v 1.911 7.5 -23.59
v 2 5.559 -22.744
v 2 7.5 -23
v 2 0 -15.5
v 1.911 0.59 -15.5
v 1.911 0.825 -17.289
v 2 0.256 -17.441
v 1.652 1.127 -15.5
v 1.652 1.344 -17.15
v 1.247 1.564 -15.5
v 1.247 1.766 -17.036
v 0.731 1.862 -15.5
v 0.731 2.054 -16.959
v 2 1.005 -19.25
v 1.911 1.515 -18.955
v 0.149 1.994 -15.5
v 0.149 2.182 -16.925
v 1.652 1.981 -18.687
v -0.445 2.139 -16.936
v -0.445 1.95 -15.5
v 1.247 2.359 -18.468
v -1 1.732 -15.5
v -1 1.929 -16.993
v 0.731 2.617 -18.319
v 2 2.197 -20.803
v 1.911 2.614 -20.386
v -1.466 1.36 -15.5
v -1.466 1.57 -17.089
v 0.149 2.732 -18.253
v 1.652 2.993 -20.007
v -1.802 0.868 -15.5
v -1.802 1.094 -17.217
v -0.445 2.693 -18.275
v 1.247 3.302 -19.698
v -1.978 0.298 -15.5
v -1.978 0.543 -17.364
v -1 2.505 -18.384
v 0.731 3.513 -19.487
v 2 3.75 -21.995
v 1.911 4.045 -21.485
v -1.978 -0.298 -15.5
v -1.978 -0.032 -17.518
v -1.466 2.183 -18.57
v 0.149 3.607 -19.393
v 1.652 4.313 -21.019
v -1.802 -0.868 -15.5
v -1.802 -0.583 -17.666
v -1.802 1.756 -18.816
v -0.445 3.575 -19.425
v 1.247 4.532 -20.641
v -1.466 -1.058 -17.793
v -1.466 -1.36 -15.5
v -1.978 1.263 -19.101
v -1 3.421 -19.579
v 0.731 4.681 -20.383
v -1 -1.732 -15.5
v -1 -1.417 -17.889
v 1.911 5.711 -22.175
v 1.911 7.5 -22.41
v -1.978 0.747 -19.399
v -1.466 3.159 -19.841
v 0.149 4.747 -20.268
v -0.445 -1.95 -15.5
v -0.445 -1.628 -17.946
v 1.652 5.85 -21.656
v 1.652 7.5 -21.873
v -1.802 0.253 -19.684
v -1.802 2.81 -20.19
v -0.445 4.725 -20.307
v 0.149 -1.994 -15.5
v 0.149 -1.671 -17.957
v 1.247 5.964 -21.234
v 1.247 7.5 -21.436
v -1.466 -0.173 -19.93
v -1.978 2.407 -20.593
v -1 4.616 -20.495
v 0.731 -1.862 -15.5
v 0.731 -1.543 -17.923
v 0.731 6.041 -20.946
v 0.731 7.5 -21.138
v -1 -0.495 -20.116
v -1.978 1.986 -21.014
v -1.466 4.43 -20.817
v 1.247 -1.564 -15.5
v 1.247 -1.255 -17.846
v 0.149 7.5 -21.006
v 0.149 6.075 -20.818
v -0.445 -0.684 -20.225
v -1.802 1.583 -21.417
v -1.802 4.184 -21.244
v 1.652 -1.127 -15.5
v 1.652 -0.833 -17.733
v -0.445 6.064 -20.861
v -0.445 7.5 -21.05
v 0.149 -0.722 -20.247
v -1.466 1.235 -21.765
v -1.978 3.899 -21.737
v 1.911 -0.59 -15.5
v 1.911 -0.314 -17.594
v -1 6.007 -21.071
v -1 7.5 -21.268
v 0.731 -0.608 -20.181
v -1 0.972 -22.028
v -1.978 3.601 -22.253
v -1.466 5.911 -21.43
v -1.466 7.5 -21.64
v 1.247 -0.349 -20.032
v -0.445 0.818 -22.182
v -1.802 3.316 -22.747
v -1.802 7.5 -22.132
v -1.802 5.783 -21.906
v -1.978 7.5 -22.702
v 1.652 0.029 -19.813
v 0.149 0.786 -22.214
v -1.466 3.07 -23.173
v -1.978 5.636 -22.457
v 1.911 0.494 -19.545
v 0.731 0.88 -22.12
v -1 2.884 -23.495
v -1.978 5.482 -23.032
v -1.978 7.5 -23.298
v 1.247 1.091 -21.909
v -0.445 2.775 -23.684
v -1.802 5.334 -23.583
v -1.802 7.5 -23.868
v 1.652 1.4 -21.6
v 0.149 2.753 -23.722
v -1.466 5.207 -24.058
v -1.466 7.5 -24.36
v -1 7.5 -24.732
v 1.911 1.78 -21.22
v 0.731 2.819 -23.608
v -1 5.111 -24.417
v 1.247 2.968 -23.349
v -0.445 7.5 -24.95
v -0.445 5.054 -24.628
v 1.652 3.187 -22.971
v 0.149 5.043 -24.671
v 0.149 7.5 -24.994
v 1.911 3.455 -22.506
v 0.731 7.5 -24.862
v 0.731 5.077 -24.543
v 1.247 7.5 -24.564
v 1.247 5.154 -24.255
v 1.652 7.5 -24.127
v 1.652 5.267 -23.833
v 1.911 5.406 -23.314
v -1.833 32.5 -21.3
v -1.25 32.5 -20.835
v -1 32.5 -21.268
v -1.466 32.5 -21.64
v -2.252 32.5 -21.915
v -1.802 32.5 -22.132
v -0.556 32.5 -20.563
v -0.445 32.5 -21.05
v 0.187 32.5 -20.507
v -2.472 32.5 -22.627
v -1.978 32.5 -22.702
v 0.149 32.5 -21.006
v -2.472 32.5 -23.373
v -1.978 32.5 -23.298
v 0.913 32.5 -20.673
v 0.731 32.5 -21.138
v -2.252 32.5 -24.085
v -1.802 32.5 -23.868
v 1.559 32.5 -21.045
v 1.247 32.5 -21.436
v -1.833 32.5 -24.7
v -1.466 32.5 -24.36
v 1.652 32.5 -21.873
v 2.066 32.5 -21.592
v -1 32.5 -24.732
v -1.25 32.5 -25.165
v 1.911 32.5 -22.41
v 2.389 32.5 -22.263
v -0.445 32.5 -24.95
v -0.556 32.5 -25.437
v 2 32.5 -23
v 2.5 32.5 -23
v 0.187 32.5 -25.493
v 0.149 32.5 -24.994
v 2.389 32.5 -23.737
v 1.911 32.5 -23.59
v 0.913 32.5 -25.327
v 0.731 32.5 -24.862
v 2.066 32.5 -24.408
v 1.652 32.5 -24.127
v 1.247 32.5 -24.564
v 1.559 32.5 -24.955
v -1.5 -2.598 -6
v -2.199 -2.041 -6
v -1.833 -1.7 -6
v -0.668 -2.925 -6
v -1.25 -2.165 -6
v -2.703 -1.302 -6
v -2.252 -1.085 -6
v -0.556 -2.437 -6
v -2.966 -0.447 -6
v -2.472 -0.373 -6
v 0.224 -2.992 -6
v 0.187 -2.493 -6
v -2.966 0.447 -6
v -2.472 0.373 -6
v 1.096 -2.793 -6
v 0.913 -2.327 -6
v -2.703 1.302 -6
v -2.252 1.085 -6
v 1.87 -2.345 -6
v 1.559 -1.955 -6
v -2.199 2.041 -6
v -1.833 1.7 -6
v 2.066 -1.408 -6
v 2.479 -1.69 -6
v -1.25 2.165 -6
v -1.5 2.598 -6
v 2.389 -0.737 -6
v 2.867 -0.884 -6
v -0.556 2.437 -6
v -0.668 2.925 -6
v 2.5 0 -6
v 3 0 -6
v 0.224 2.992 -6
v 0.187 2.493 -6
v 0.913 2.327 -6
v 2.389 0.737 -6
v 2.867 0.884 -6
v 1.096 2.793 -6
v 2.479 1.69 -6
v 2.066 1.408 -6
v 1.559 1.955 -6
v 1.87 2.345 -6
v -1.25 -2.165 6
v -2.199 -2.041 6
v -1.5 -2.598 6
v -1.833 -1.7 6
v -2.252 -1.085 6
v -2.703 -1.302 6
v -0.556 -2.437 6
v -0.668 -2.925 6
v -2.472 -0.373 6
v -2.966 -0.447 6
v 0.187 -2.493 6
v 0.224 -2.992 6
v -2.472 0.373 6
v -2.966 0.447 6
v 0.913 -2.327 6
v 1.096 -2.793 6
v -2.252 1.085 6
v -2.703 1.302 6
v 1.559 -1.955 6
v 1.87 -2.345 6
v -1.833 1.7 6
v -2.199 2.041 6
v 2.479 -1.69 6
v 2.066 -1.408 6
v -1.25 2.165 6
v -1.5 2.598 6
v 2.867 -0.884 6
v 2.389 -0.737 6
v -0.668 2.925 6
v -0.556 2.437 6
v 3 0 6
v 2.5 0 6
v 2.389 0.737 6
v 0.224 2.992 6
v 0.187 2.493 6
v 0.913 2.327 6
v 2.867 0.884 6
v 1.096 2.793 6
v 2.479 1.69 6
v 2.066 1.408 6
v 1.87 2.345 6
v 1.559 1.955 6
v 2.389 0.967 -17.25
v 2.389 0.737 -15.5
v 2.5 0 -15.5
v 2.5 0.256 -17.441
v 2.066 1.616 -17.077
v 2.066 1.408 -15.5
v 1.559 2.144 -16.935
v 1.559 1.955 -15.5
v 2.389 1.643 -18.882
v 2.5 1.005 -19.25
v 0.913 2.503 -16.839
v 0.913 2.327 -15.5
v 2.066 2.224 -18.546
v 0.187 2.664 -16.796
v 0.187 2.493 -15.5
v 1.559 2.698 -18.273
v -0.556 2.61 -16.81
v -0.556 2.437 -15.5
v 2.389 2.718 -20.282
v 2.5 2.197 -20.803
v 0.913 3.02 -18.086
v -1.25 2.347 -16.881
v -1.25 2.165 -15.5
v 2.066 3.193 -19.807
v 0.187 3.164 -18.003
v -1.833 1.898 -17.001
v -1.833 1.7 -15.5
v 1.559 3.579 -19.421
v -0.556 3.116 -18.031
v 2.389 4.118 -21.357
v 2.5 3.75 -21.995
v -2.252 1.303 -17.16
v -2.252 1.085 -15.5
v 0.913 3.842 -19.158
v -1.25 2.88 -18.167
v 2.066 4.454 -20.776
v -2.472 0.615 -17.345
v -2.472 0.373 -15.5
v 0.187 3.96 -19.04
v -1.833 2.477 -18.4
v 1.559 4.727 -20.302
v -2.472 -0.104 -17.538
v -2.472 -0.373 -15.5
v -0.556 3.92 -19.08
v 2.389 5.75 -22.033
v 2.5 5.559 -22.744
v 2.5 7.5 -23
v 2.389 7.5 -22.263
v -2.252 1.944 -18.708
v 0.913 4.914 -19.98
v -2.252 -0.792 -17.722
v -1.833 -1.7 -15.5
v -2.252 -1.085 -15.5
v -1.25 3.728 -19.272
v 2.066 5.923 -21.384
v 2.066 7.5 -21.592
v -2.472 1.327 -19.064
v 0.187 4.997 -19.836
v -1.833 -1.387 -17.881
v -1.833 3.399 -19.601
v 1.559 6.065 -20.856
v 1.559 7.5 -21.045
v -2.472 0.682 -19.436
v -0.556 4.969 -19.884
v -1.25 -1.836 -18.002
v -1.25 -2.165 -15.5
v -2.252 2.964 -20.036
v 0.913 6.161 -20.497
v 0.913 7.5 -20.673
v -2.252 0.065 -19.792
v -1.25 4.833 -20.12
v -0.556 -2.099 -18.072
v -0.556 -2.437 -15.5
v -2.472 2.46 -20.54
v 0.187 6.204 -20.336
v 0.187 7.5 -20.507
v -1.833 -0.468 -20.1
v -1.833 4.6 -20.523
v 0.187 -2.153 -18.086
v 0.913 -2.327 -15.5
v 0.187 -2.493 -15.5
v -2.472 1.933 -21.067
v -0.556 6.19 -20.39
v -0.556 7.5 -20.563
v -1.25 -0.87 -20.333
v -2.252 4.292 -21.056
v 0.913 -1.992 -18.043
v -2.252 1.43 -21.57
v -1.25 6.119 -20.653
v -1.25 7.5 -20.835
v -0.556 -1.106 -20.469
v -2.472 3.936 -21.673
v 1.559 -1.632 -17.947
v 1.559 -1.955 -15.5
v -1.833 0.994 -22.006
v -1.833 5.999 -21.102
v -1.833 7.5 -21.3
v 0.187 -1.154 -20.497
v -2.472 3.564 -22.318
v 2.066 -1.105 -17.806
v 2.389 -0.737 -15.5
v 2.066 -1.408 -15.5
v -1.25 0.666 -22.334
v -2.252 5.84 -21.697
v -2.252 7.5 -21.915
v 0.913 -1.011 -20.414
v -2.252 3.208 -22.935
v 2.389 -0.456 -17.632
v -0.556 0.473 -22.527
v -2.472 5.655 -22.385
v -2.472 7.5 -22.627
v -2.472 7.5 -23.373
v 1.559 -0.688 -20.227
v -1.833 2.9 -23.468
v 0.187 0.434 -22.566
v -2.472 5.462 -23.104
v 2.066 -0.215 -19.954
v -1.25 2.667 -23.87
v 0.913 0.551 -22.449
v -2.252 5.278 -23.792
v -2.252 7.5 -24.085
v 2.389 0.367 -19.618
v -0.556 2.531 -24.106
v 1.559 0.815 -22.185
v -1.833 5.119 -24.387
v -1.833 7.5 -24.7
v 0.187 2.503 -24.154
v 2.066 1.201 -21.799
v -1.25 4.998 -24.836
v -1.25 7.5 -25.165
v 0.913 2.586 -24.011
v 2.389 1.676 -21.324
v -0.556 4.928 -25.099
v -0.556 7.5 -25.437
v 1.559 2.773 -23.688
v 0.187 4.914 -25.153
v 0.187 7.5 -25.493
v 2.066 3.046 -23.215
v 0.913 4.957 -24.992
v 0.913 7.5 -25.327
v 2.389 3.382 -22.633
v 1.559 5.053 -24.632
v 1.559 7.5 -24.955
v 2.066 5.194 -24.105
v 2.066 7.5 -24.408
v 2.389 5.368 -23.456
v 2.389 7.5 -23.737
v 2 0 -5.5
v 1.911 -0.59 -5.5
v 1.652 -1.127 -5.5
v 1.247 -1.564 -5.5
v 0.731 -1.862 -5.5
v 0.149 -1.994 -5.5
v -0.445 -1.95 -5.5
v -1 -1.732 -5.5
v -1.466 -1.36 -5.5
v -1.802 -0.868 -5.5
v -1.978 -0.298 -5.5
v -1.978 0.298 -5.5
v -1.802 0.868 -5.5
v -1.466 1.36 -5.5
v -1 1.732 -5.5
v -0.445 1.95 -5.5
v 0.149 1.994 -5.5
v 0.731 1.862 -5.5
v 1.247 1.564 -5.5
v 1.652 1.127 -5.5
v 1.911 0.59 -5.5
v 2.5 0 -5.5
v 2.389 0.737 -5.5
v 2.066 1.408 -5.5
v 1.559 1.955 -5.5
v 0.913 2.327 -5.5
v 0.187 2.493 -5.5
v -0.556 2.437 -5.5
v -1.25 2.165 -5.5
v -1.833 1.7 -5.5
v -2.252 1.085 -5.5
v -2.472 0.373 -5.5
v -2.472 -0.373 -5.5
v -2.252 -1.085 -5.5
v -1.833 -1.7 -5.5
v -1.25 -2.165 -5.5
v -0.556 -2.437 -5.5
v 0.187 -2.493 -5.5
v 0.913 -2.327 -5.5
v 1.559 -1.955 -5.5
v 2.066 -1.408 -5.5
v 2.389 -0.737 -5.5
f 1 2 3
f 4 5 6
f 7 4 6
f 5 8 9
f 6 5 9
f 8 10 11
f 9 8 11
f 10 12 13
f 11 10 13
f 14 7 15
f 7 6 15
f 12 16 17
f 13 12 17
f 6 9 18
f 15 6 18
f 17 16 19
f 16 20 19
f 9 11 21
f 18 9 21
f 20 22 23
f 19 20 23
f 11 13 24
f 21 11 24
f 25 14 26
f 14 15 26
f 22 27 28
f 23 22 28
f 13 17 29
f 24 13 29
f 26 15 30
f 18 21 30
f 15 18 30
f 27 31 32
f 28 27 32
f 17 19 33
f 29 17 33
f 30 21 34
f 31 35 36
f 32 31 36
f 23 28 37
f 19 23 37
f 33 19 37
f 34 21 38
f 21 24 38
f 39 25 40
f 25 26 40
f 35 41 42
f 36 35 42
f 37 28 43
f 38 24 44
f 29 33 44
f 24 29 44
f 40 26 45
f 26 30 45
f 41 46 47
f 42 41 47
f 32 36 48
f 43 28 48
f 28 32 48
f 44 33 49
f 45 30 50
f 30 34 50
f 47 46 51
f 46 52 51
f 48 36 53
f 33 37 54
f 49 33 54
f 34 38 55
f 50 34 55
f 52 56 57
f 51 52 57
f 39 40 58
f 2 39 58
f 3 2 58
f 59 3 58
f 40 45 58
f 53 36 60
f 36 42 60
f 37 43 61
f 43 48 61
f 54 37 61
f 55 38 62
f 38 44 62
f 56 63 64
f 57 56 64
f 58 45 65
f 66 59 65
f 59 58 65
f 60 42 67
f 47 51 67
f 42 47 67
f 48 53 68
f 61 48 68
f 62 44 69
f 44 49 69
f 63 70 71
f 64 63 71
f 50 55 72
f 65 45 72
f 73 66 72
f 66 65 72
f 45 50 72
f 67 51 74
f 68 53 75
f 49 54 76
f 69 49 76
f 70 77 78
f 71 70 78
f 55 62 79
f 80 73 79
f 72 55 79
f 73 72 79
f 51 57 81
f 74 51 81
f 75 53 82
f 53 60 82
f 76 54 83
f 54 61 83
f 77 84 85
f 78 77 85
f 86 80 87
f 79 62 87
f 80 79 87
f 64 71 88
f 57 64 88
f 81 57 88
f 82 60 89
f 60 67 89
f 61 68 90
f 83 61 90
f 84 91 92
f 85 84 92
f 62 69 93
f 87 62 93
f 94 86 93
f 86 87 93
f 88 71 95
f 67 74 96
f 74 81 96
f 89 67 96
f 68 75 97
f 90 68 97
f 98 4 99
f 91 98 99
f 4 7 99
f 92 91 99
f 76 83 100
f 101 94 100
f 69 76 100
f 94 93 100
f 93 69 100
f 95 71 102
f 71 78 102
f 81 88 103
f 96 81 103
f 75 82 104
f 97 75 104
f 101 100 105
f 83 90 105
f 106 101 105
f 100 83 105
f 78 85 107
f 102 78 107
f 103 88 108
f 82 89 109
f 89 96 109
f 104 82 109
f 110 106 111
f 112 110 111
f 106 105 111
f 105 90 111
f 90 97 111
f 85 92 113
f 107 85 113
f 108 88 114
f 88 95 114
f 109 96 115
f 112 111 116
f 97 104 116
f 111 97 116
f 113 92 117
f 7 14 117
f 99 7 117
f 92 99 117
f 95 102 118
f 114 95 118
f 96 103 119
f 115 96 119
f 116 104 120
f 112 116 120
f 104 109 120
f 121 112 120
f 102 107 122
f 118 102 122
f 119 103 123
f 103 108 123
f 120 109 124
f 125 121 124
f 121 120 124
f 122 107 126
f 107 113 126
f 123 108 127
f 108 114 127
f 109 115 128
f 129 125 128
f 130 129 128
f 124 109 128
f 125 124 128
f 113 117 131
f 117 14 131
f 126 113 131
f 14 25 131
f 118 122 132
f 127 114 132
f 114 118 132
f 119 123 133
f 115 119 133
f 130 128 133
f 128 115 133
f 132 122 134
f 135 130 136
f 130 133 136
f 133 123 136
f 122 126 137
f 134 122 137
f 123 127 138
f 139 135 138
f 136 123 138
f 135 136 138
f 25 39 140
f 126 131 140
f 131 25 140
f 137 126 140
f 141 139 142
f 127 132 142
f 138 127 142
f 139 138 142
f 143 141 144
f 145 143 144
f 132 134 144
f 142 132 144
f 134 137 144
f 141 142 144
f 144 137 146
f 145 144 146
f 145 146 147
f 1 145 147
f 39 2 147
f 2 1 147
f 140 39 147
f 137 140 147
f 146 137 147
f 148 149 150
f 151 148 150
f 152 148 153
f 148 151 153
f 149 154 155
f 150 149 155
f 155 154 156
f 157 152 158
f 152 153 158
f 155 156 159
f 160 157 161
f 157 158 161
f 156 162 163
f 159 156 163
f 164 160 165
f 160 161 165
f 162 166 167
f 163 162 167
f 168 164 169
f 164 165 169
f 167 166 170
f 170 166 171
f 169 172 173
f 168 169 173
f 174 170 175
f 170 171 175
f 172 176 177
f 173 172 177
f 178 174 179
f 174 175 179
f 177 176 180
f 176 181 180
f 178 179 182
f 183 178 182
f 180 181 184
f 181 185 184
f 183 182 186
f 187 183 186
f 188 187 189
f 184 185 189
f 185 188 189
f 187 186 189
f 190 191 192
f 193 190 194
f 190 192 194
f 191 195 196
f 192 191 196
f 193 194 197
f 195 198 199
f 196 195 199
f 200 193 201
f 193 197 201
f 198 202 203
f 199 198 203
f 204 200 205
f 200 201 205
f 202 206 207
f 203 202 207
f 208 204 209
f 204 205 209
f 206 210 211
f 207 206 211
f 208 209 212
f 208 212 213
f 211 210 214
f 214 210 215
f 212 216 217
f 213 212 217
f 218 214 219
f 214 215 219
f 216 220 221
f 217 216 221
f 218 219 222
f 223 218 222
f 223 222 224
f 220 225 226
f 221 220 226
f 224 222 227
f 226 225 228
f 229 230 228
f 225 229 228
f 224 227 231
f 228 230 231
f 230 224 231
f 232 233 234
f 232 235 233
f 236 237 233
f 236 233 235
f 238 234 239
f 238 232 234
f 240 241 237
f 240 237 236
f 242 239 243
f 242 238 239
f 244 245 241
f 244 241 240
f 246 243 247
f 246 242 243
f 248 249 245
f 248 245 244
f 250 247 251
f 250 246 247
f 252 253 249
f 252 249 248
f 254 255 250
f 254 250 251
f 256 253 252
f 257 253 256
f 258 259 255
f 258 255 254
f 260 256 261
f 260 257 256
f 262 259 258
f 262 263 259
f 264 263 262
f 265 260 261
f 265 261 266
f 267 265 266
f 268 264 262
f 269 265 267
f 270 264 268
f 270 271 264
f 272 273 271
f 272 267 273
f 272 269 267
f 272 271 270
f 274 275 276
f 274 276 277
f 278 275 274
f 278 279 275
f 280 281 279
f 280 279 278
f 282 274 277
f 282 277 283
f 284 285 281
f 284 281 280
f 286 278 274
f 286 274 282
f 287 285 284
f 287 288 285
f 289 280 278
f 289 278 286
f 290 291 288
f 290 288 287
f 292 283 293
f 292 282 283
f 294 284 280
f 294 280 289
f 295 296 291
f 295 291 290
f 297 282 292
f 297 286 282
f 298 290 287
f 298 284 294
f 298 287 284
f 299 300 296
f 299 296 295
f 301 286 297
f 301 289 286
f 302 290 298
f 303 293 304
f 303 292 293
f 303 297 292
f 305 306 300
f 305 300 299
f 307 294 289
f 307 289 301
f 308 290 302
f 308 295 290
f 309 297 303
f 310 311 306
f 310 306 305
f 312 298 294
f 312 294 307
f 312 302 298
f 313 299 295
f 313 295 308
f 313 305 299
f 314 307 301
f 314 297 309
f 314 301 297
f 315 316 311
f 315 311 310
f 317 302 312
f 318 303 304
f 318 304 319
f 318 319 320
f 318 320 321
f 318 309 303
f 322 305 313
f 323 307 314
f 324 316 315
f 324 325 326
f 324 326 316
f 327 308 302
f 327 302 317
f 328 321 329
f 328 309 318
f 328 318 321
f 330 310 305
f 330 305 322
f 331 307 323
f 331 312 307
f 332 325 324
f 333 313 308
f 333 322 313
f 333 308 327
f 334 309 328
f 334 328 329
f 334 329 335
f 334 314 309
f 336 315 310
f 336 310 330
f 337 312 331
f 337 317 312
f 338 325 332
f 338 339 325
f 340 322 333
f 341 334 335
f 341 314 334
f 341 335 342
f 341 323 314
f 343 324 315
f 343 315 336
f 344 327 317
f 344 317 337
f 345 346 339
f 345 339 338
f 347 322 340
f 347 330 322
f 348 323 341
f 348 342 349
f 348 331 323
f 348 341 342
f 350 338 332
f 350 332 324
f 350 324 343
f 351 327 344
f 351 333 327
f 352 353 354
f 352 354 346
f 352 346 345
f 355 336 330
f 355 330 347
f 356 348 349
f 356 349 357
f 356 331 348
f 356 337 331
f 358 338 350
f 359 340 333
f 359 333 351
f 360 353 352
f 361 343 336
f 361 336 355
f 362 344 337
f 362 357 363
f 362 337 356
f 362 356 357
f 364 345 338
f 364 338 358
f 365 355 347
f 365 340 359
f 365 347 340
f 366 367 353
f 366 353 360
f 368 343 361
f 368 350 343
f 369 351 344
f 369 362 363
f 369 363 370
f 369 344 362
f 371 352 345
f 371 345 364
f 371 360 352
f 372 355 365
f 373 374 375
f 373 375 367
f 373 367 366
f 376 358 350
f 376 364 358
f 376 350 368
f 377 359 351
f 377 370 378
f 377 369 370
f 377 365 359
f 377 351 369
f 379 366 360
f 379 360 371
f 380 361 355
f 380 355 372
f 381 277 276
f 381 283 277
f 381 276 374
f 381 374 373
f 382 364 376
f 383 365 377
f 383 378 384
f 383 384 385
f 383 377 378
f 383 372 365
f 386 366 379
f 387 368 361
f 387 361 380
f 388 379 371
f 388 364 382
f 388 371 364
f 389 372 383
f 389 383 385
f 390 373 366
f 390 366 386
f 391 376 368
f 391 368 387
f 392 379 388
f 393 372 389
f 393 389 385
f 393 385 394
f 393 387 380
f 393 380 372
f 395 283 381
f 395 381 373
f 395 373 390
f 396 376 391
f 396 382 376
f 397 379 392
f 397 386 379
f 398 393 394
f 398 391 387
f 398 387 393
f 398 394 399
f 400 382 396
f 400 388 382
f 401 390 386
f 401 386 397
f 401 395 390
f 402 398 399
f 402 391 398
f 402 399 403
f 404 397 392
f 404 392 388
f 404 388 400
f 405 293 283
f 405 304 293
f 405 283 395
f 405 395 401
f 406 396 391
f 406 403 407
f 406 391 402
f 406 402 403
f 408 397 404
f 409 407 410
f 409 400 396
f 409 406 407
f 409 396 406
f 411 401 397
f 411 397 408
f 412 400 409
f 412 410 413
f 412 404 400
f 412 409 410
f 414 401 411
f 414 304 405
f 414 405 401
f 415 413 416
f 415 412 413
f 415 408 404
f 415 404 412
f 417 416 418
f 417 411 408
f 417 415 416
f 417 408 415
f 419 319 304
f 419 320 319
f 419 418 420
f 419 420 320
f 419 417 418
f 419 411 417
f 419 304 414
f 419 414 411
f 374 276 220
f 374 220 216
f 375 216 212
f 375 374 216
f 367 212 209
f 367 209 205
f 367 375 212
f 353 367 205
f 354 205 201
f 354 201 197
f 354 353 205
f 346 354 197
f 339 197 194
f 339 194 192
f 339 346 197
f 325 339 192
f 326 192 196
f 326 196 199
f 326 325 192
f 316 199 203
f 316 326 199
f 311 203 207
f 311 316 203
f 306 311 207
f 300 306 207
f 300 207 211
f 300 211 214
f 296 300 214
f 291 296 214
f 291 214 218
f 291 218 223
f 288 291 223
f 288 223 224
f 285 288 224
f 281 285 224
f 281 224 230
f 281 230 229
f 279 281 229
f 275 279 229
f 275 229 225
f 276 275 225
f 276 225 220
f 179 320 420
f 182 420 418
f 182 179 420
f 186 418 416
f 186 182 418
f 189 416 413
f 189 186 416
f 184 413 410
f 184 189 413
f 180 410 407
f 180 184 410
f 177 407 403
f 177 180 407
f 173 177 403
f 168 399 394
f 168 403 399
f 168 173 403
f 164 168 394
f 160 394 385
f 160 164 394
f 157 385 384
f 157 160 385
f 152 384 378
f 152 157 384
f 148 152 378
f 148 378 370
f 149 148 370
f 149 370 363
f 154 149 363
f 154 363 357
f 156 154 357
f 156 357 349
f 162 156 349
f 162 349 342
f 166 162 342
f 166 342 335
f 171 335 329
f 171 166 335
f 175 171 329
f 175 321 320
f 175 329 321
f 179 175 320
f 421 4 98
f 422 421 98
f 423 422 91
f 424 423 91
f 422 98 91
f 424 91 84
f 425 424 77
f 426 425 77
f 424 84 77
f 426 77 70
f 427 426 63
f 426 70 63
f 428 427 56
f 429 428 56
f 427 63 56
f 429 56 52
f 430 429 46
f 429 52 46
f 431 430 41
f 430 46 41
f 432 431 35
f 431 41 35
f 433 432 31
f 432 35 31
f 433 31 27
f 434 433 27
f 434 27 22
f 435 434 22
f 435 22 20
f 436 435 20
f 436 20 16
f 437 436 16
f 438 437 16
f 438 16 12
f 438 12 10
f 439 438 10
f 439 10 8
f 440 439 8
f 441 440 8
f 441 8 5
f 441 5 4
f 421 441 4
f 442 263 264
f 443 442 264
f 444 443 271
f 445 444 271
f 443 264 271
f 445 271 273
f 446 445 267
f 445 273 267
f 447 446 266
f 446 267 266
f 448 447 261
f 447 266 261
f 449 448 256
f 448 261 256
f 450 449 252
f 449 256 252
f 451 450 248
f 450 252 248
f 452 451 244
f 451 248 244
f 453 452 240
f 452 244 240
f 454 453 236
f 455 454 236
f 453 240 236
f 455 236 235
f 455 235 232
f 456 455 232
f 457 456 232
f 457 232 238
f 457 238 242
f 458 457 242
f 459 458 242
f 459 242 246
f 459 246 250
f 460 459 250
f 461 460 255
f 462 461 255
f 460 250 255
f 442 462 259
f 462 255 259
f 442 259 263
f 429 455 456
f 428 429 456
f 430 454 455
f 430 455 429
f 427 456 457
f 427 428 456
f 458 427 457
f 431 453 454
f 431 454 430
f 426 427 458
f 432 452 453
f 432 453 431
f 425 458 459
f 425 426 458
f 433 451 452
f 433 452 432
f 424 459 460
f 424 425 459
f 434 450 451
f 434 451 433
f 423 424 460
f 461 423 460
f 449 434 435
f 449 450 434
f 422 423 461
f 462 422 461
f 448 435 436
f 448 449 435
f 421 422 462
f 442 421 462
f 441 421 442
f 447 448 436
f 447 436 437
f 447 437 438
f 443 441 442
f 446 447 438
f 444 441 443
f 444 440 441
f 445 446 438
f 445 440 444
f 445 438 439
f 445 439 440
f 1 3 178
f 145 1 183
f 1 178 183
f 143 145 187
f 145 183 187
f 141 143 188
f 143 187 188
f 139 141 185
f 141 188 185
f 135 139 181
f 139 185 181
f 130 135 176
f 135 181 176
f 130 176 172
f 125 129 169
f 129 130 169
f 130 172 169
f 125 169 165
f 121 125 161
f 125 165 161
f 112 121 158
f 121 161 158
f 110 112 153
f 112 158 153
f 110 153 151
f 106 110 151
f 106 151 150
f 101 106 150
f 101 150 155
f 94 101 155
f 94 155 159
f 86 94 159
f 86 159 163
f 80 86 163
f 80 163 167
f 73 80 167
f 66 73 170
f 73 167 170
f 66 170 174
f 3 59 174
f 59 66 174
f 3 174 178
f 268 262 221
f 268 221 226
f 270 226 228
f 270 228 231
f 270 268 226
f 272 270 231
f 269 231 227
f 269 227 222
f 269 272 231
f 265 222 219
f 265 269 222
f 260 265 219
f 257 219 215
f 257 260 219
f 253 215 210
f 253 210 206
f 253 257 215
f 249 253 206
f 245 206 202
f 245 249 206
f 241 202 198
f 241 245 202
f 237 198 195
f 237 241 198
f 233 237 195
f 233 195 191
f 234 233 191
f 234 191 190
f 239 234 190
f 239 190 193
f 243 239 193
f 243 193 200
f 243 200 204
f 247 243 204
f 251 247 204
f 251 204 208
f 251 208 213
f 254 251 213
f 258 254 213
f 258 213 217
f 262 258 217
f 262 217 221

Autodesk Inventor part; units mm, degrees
ref_plane "YZ Plane" through (0, 0, 0) normal (1, 0, 0) x (0, 1, 0)
ref_plane "XZ Plane" through (0, 0, 0) normal (0, 1, 0) x (-1, 0, 0)
ref_plane "XY Plane" through (0, 0, 0) normal (0, 0, 1) x (1, 0, 0)
sketch "Sketch1" plane through (0, 0, 0) normal (0, 0, 1) x (1, 0, 0)
  circle A0 centre (0, 0) radius 2.5
  dimension "d0" = 5
sketch "Sketch2" plane through (0, 0, 0) normal (1, 0, 0) x (0, 1, 0)
  line L0 (0, 0) -> (0, -15.5)
  line L1 (7.5, -23) -> (32.5, -23)
  arc A0 (0, -15.5) -> (7.5, -23) centre (7.5, -15.5) ccw
  point P0 (0, -23)
  dimension "d1" = 23
  dimension "d2" = 7.5
  dimension "d3" = 25
sweep "Sweep1" add profiles "Sketch1" path "Sketch2"
sketch "Sketch3" plane through (0, 0, 0) normal (0, 0, 1) x (1, 0, 0)
  circle A0 centre (0, 0) radius 3
  dimension "d6" = 6
extrude "Extrusion1" add sketch "Sketch3" along normal mid plane 12
shell "Shell1" thickness 0.5 removed faces 2 at (-0.5351, 1.0949, 6) at (-0.2146, 32.5, -22.3381)
properties part number "161" material "Iron, Cast"
